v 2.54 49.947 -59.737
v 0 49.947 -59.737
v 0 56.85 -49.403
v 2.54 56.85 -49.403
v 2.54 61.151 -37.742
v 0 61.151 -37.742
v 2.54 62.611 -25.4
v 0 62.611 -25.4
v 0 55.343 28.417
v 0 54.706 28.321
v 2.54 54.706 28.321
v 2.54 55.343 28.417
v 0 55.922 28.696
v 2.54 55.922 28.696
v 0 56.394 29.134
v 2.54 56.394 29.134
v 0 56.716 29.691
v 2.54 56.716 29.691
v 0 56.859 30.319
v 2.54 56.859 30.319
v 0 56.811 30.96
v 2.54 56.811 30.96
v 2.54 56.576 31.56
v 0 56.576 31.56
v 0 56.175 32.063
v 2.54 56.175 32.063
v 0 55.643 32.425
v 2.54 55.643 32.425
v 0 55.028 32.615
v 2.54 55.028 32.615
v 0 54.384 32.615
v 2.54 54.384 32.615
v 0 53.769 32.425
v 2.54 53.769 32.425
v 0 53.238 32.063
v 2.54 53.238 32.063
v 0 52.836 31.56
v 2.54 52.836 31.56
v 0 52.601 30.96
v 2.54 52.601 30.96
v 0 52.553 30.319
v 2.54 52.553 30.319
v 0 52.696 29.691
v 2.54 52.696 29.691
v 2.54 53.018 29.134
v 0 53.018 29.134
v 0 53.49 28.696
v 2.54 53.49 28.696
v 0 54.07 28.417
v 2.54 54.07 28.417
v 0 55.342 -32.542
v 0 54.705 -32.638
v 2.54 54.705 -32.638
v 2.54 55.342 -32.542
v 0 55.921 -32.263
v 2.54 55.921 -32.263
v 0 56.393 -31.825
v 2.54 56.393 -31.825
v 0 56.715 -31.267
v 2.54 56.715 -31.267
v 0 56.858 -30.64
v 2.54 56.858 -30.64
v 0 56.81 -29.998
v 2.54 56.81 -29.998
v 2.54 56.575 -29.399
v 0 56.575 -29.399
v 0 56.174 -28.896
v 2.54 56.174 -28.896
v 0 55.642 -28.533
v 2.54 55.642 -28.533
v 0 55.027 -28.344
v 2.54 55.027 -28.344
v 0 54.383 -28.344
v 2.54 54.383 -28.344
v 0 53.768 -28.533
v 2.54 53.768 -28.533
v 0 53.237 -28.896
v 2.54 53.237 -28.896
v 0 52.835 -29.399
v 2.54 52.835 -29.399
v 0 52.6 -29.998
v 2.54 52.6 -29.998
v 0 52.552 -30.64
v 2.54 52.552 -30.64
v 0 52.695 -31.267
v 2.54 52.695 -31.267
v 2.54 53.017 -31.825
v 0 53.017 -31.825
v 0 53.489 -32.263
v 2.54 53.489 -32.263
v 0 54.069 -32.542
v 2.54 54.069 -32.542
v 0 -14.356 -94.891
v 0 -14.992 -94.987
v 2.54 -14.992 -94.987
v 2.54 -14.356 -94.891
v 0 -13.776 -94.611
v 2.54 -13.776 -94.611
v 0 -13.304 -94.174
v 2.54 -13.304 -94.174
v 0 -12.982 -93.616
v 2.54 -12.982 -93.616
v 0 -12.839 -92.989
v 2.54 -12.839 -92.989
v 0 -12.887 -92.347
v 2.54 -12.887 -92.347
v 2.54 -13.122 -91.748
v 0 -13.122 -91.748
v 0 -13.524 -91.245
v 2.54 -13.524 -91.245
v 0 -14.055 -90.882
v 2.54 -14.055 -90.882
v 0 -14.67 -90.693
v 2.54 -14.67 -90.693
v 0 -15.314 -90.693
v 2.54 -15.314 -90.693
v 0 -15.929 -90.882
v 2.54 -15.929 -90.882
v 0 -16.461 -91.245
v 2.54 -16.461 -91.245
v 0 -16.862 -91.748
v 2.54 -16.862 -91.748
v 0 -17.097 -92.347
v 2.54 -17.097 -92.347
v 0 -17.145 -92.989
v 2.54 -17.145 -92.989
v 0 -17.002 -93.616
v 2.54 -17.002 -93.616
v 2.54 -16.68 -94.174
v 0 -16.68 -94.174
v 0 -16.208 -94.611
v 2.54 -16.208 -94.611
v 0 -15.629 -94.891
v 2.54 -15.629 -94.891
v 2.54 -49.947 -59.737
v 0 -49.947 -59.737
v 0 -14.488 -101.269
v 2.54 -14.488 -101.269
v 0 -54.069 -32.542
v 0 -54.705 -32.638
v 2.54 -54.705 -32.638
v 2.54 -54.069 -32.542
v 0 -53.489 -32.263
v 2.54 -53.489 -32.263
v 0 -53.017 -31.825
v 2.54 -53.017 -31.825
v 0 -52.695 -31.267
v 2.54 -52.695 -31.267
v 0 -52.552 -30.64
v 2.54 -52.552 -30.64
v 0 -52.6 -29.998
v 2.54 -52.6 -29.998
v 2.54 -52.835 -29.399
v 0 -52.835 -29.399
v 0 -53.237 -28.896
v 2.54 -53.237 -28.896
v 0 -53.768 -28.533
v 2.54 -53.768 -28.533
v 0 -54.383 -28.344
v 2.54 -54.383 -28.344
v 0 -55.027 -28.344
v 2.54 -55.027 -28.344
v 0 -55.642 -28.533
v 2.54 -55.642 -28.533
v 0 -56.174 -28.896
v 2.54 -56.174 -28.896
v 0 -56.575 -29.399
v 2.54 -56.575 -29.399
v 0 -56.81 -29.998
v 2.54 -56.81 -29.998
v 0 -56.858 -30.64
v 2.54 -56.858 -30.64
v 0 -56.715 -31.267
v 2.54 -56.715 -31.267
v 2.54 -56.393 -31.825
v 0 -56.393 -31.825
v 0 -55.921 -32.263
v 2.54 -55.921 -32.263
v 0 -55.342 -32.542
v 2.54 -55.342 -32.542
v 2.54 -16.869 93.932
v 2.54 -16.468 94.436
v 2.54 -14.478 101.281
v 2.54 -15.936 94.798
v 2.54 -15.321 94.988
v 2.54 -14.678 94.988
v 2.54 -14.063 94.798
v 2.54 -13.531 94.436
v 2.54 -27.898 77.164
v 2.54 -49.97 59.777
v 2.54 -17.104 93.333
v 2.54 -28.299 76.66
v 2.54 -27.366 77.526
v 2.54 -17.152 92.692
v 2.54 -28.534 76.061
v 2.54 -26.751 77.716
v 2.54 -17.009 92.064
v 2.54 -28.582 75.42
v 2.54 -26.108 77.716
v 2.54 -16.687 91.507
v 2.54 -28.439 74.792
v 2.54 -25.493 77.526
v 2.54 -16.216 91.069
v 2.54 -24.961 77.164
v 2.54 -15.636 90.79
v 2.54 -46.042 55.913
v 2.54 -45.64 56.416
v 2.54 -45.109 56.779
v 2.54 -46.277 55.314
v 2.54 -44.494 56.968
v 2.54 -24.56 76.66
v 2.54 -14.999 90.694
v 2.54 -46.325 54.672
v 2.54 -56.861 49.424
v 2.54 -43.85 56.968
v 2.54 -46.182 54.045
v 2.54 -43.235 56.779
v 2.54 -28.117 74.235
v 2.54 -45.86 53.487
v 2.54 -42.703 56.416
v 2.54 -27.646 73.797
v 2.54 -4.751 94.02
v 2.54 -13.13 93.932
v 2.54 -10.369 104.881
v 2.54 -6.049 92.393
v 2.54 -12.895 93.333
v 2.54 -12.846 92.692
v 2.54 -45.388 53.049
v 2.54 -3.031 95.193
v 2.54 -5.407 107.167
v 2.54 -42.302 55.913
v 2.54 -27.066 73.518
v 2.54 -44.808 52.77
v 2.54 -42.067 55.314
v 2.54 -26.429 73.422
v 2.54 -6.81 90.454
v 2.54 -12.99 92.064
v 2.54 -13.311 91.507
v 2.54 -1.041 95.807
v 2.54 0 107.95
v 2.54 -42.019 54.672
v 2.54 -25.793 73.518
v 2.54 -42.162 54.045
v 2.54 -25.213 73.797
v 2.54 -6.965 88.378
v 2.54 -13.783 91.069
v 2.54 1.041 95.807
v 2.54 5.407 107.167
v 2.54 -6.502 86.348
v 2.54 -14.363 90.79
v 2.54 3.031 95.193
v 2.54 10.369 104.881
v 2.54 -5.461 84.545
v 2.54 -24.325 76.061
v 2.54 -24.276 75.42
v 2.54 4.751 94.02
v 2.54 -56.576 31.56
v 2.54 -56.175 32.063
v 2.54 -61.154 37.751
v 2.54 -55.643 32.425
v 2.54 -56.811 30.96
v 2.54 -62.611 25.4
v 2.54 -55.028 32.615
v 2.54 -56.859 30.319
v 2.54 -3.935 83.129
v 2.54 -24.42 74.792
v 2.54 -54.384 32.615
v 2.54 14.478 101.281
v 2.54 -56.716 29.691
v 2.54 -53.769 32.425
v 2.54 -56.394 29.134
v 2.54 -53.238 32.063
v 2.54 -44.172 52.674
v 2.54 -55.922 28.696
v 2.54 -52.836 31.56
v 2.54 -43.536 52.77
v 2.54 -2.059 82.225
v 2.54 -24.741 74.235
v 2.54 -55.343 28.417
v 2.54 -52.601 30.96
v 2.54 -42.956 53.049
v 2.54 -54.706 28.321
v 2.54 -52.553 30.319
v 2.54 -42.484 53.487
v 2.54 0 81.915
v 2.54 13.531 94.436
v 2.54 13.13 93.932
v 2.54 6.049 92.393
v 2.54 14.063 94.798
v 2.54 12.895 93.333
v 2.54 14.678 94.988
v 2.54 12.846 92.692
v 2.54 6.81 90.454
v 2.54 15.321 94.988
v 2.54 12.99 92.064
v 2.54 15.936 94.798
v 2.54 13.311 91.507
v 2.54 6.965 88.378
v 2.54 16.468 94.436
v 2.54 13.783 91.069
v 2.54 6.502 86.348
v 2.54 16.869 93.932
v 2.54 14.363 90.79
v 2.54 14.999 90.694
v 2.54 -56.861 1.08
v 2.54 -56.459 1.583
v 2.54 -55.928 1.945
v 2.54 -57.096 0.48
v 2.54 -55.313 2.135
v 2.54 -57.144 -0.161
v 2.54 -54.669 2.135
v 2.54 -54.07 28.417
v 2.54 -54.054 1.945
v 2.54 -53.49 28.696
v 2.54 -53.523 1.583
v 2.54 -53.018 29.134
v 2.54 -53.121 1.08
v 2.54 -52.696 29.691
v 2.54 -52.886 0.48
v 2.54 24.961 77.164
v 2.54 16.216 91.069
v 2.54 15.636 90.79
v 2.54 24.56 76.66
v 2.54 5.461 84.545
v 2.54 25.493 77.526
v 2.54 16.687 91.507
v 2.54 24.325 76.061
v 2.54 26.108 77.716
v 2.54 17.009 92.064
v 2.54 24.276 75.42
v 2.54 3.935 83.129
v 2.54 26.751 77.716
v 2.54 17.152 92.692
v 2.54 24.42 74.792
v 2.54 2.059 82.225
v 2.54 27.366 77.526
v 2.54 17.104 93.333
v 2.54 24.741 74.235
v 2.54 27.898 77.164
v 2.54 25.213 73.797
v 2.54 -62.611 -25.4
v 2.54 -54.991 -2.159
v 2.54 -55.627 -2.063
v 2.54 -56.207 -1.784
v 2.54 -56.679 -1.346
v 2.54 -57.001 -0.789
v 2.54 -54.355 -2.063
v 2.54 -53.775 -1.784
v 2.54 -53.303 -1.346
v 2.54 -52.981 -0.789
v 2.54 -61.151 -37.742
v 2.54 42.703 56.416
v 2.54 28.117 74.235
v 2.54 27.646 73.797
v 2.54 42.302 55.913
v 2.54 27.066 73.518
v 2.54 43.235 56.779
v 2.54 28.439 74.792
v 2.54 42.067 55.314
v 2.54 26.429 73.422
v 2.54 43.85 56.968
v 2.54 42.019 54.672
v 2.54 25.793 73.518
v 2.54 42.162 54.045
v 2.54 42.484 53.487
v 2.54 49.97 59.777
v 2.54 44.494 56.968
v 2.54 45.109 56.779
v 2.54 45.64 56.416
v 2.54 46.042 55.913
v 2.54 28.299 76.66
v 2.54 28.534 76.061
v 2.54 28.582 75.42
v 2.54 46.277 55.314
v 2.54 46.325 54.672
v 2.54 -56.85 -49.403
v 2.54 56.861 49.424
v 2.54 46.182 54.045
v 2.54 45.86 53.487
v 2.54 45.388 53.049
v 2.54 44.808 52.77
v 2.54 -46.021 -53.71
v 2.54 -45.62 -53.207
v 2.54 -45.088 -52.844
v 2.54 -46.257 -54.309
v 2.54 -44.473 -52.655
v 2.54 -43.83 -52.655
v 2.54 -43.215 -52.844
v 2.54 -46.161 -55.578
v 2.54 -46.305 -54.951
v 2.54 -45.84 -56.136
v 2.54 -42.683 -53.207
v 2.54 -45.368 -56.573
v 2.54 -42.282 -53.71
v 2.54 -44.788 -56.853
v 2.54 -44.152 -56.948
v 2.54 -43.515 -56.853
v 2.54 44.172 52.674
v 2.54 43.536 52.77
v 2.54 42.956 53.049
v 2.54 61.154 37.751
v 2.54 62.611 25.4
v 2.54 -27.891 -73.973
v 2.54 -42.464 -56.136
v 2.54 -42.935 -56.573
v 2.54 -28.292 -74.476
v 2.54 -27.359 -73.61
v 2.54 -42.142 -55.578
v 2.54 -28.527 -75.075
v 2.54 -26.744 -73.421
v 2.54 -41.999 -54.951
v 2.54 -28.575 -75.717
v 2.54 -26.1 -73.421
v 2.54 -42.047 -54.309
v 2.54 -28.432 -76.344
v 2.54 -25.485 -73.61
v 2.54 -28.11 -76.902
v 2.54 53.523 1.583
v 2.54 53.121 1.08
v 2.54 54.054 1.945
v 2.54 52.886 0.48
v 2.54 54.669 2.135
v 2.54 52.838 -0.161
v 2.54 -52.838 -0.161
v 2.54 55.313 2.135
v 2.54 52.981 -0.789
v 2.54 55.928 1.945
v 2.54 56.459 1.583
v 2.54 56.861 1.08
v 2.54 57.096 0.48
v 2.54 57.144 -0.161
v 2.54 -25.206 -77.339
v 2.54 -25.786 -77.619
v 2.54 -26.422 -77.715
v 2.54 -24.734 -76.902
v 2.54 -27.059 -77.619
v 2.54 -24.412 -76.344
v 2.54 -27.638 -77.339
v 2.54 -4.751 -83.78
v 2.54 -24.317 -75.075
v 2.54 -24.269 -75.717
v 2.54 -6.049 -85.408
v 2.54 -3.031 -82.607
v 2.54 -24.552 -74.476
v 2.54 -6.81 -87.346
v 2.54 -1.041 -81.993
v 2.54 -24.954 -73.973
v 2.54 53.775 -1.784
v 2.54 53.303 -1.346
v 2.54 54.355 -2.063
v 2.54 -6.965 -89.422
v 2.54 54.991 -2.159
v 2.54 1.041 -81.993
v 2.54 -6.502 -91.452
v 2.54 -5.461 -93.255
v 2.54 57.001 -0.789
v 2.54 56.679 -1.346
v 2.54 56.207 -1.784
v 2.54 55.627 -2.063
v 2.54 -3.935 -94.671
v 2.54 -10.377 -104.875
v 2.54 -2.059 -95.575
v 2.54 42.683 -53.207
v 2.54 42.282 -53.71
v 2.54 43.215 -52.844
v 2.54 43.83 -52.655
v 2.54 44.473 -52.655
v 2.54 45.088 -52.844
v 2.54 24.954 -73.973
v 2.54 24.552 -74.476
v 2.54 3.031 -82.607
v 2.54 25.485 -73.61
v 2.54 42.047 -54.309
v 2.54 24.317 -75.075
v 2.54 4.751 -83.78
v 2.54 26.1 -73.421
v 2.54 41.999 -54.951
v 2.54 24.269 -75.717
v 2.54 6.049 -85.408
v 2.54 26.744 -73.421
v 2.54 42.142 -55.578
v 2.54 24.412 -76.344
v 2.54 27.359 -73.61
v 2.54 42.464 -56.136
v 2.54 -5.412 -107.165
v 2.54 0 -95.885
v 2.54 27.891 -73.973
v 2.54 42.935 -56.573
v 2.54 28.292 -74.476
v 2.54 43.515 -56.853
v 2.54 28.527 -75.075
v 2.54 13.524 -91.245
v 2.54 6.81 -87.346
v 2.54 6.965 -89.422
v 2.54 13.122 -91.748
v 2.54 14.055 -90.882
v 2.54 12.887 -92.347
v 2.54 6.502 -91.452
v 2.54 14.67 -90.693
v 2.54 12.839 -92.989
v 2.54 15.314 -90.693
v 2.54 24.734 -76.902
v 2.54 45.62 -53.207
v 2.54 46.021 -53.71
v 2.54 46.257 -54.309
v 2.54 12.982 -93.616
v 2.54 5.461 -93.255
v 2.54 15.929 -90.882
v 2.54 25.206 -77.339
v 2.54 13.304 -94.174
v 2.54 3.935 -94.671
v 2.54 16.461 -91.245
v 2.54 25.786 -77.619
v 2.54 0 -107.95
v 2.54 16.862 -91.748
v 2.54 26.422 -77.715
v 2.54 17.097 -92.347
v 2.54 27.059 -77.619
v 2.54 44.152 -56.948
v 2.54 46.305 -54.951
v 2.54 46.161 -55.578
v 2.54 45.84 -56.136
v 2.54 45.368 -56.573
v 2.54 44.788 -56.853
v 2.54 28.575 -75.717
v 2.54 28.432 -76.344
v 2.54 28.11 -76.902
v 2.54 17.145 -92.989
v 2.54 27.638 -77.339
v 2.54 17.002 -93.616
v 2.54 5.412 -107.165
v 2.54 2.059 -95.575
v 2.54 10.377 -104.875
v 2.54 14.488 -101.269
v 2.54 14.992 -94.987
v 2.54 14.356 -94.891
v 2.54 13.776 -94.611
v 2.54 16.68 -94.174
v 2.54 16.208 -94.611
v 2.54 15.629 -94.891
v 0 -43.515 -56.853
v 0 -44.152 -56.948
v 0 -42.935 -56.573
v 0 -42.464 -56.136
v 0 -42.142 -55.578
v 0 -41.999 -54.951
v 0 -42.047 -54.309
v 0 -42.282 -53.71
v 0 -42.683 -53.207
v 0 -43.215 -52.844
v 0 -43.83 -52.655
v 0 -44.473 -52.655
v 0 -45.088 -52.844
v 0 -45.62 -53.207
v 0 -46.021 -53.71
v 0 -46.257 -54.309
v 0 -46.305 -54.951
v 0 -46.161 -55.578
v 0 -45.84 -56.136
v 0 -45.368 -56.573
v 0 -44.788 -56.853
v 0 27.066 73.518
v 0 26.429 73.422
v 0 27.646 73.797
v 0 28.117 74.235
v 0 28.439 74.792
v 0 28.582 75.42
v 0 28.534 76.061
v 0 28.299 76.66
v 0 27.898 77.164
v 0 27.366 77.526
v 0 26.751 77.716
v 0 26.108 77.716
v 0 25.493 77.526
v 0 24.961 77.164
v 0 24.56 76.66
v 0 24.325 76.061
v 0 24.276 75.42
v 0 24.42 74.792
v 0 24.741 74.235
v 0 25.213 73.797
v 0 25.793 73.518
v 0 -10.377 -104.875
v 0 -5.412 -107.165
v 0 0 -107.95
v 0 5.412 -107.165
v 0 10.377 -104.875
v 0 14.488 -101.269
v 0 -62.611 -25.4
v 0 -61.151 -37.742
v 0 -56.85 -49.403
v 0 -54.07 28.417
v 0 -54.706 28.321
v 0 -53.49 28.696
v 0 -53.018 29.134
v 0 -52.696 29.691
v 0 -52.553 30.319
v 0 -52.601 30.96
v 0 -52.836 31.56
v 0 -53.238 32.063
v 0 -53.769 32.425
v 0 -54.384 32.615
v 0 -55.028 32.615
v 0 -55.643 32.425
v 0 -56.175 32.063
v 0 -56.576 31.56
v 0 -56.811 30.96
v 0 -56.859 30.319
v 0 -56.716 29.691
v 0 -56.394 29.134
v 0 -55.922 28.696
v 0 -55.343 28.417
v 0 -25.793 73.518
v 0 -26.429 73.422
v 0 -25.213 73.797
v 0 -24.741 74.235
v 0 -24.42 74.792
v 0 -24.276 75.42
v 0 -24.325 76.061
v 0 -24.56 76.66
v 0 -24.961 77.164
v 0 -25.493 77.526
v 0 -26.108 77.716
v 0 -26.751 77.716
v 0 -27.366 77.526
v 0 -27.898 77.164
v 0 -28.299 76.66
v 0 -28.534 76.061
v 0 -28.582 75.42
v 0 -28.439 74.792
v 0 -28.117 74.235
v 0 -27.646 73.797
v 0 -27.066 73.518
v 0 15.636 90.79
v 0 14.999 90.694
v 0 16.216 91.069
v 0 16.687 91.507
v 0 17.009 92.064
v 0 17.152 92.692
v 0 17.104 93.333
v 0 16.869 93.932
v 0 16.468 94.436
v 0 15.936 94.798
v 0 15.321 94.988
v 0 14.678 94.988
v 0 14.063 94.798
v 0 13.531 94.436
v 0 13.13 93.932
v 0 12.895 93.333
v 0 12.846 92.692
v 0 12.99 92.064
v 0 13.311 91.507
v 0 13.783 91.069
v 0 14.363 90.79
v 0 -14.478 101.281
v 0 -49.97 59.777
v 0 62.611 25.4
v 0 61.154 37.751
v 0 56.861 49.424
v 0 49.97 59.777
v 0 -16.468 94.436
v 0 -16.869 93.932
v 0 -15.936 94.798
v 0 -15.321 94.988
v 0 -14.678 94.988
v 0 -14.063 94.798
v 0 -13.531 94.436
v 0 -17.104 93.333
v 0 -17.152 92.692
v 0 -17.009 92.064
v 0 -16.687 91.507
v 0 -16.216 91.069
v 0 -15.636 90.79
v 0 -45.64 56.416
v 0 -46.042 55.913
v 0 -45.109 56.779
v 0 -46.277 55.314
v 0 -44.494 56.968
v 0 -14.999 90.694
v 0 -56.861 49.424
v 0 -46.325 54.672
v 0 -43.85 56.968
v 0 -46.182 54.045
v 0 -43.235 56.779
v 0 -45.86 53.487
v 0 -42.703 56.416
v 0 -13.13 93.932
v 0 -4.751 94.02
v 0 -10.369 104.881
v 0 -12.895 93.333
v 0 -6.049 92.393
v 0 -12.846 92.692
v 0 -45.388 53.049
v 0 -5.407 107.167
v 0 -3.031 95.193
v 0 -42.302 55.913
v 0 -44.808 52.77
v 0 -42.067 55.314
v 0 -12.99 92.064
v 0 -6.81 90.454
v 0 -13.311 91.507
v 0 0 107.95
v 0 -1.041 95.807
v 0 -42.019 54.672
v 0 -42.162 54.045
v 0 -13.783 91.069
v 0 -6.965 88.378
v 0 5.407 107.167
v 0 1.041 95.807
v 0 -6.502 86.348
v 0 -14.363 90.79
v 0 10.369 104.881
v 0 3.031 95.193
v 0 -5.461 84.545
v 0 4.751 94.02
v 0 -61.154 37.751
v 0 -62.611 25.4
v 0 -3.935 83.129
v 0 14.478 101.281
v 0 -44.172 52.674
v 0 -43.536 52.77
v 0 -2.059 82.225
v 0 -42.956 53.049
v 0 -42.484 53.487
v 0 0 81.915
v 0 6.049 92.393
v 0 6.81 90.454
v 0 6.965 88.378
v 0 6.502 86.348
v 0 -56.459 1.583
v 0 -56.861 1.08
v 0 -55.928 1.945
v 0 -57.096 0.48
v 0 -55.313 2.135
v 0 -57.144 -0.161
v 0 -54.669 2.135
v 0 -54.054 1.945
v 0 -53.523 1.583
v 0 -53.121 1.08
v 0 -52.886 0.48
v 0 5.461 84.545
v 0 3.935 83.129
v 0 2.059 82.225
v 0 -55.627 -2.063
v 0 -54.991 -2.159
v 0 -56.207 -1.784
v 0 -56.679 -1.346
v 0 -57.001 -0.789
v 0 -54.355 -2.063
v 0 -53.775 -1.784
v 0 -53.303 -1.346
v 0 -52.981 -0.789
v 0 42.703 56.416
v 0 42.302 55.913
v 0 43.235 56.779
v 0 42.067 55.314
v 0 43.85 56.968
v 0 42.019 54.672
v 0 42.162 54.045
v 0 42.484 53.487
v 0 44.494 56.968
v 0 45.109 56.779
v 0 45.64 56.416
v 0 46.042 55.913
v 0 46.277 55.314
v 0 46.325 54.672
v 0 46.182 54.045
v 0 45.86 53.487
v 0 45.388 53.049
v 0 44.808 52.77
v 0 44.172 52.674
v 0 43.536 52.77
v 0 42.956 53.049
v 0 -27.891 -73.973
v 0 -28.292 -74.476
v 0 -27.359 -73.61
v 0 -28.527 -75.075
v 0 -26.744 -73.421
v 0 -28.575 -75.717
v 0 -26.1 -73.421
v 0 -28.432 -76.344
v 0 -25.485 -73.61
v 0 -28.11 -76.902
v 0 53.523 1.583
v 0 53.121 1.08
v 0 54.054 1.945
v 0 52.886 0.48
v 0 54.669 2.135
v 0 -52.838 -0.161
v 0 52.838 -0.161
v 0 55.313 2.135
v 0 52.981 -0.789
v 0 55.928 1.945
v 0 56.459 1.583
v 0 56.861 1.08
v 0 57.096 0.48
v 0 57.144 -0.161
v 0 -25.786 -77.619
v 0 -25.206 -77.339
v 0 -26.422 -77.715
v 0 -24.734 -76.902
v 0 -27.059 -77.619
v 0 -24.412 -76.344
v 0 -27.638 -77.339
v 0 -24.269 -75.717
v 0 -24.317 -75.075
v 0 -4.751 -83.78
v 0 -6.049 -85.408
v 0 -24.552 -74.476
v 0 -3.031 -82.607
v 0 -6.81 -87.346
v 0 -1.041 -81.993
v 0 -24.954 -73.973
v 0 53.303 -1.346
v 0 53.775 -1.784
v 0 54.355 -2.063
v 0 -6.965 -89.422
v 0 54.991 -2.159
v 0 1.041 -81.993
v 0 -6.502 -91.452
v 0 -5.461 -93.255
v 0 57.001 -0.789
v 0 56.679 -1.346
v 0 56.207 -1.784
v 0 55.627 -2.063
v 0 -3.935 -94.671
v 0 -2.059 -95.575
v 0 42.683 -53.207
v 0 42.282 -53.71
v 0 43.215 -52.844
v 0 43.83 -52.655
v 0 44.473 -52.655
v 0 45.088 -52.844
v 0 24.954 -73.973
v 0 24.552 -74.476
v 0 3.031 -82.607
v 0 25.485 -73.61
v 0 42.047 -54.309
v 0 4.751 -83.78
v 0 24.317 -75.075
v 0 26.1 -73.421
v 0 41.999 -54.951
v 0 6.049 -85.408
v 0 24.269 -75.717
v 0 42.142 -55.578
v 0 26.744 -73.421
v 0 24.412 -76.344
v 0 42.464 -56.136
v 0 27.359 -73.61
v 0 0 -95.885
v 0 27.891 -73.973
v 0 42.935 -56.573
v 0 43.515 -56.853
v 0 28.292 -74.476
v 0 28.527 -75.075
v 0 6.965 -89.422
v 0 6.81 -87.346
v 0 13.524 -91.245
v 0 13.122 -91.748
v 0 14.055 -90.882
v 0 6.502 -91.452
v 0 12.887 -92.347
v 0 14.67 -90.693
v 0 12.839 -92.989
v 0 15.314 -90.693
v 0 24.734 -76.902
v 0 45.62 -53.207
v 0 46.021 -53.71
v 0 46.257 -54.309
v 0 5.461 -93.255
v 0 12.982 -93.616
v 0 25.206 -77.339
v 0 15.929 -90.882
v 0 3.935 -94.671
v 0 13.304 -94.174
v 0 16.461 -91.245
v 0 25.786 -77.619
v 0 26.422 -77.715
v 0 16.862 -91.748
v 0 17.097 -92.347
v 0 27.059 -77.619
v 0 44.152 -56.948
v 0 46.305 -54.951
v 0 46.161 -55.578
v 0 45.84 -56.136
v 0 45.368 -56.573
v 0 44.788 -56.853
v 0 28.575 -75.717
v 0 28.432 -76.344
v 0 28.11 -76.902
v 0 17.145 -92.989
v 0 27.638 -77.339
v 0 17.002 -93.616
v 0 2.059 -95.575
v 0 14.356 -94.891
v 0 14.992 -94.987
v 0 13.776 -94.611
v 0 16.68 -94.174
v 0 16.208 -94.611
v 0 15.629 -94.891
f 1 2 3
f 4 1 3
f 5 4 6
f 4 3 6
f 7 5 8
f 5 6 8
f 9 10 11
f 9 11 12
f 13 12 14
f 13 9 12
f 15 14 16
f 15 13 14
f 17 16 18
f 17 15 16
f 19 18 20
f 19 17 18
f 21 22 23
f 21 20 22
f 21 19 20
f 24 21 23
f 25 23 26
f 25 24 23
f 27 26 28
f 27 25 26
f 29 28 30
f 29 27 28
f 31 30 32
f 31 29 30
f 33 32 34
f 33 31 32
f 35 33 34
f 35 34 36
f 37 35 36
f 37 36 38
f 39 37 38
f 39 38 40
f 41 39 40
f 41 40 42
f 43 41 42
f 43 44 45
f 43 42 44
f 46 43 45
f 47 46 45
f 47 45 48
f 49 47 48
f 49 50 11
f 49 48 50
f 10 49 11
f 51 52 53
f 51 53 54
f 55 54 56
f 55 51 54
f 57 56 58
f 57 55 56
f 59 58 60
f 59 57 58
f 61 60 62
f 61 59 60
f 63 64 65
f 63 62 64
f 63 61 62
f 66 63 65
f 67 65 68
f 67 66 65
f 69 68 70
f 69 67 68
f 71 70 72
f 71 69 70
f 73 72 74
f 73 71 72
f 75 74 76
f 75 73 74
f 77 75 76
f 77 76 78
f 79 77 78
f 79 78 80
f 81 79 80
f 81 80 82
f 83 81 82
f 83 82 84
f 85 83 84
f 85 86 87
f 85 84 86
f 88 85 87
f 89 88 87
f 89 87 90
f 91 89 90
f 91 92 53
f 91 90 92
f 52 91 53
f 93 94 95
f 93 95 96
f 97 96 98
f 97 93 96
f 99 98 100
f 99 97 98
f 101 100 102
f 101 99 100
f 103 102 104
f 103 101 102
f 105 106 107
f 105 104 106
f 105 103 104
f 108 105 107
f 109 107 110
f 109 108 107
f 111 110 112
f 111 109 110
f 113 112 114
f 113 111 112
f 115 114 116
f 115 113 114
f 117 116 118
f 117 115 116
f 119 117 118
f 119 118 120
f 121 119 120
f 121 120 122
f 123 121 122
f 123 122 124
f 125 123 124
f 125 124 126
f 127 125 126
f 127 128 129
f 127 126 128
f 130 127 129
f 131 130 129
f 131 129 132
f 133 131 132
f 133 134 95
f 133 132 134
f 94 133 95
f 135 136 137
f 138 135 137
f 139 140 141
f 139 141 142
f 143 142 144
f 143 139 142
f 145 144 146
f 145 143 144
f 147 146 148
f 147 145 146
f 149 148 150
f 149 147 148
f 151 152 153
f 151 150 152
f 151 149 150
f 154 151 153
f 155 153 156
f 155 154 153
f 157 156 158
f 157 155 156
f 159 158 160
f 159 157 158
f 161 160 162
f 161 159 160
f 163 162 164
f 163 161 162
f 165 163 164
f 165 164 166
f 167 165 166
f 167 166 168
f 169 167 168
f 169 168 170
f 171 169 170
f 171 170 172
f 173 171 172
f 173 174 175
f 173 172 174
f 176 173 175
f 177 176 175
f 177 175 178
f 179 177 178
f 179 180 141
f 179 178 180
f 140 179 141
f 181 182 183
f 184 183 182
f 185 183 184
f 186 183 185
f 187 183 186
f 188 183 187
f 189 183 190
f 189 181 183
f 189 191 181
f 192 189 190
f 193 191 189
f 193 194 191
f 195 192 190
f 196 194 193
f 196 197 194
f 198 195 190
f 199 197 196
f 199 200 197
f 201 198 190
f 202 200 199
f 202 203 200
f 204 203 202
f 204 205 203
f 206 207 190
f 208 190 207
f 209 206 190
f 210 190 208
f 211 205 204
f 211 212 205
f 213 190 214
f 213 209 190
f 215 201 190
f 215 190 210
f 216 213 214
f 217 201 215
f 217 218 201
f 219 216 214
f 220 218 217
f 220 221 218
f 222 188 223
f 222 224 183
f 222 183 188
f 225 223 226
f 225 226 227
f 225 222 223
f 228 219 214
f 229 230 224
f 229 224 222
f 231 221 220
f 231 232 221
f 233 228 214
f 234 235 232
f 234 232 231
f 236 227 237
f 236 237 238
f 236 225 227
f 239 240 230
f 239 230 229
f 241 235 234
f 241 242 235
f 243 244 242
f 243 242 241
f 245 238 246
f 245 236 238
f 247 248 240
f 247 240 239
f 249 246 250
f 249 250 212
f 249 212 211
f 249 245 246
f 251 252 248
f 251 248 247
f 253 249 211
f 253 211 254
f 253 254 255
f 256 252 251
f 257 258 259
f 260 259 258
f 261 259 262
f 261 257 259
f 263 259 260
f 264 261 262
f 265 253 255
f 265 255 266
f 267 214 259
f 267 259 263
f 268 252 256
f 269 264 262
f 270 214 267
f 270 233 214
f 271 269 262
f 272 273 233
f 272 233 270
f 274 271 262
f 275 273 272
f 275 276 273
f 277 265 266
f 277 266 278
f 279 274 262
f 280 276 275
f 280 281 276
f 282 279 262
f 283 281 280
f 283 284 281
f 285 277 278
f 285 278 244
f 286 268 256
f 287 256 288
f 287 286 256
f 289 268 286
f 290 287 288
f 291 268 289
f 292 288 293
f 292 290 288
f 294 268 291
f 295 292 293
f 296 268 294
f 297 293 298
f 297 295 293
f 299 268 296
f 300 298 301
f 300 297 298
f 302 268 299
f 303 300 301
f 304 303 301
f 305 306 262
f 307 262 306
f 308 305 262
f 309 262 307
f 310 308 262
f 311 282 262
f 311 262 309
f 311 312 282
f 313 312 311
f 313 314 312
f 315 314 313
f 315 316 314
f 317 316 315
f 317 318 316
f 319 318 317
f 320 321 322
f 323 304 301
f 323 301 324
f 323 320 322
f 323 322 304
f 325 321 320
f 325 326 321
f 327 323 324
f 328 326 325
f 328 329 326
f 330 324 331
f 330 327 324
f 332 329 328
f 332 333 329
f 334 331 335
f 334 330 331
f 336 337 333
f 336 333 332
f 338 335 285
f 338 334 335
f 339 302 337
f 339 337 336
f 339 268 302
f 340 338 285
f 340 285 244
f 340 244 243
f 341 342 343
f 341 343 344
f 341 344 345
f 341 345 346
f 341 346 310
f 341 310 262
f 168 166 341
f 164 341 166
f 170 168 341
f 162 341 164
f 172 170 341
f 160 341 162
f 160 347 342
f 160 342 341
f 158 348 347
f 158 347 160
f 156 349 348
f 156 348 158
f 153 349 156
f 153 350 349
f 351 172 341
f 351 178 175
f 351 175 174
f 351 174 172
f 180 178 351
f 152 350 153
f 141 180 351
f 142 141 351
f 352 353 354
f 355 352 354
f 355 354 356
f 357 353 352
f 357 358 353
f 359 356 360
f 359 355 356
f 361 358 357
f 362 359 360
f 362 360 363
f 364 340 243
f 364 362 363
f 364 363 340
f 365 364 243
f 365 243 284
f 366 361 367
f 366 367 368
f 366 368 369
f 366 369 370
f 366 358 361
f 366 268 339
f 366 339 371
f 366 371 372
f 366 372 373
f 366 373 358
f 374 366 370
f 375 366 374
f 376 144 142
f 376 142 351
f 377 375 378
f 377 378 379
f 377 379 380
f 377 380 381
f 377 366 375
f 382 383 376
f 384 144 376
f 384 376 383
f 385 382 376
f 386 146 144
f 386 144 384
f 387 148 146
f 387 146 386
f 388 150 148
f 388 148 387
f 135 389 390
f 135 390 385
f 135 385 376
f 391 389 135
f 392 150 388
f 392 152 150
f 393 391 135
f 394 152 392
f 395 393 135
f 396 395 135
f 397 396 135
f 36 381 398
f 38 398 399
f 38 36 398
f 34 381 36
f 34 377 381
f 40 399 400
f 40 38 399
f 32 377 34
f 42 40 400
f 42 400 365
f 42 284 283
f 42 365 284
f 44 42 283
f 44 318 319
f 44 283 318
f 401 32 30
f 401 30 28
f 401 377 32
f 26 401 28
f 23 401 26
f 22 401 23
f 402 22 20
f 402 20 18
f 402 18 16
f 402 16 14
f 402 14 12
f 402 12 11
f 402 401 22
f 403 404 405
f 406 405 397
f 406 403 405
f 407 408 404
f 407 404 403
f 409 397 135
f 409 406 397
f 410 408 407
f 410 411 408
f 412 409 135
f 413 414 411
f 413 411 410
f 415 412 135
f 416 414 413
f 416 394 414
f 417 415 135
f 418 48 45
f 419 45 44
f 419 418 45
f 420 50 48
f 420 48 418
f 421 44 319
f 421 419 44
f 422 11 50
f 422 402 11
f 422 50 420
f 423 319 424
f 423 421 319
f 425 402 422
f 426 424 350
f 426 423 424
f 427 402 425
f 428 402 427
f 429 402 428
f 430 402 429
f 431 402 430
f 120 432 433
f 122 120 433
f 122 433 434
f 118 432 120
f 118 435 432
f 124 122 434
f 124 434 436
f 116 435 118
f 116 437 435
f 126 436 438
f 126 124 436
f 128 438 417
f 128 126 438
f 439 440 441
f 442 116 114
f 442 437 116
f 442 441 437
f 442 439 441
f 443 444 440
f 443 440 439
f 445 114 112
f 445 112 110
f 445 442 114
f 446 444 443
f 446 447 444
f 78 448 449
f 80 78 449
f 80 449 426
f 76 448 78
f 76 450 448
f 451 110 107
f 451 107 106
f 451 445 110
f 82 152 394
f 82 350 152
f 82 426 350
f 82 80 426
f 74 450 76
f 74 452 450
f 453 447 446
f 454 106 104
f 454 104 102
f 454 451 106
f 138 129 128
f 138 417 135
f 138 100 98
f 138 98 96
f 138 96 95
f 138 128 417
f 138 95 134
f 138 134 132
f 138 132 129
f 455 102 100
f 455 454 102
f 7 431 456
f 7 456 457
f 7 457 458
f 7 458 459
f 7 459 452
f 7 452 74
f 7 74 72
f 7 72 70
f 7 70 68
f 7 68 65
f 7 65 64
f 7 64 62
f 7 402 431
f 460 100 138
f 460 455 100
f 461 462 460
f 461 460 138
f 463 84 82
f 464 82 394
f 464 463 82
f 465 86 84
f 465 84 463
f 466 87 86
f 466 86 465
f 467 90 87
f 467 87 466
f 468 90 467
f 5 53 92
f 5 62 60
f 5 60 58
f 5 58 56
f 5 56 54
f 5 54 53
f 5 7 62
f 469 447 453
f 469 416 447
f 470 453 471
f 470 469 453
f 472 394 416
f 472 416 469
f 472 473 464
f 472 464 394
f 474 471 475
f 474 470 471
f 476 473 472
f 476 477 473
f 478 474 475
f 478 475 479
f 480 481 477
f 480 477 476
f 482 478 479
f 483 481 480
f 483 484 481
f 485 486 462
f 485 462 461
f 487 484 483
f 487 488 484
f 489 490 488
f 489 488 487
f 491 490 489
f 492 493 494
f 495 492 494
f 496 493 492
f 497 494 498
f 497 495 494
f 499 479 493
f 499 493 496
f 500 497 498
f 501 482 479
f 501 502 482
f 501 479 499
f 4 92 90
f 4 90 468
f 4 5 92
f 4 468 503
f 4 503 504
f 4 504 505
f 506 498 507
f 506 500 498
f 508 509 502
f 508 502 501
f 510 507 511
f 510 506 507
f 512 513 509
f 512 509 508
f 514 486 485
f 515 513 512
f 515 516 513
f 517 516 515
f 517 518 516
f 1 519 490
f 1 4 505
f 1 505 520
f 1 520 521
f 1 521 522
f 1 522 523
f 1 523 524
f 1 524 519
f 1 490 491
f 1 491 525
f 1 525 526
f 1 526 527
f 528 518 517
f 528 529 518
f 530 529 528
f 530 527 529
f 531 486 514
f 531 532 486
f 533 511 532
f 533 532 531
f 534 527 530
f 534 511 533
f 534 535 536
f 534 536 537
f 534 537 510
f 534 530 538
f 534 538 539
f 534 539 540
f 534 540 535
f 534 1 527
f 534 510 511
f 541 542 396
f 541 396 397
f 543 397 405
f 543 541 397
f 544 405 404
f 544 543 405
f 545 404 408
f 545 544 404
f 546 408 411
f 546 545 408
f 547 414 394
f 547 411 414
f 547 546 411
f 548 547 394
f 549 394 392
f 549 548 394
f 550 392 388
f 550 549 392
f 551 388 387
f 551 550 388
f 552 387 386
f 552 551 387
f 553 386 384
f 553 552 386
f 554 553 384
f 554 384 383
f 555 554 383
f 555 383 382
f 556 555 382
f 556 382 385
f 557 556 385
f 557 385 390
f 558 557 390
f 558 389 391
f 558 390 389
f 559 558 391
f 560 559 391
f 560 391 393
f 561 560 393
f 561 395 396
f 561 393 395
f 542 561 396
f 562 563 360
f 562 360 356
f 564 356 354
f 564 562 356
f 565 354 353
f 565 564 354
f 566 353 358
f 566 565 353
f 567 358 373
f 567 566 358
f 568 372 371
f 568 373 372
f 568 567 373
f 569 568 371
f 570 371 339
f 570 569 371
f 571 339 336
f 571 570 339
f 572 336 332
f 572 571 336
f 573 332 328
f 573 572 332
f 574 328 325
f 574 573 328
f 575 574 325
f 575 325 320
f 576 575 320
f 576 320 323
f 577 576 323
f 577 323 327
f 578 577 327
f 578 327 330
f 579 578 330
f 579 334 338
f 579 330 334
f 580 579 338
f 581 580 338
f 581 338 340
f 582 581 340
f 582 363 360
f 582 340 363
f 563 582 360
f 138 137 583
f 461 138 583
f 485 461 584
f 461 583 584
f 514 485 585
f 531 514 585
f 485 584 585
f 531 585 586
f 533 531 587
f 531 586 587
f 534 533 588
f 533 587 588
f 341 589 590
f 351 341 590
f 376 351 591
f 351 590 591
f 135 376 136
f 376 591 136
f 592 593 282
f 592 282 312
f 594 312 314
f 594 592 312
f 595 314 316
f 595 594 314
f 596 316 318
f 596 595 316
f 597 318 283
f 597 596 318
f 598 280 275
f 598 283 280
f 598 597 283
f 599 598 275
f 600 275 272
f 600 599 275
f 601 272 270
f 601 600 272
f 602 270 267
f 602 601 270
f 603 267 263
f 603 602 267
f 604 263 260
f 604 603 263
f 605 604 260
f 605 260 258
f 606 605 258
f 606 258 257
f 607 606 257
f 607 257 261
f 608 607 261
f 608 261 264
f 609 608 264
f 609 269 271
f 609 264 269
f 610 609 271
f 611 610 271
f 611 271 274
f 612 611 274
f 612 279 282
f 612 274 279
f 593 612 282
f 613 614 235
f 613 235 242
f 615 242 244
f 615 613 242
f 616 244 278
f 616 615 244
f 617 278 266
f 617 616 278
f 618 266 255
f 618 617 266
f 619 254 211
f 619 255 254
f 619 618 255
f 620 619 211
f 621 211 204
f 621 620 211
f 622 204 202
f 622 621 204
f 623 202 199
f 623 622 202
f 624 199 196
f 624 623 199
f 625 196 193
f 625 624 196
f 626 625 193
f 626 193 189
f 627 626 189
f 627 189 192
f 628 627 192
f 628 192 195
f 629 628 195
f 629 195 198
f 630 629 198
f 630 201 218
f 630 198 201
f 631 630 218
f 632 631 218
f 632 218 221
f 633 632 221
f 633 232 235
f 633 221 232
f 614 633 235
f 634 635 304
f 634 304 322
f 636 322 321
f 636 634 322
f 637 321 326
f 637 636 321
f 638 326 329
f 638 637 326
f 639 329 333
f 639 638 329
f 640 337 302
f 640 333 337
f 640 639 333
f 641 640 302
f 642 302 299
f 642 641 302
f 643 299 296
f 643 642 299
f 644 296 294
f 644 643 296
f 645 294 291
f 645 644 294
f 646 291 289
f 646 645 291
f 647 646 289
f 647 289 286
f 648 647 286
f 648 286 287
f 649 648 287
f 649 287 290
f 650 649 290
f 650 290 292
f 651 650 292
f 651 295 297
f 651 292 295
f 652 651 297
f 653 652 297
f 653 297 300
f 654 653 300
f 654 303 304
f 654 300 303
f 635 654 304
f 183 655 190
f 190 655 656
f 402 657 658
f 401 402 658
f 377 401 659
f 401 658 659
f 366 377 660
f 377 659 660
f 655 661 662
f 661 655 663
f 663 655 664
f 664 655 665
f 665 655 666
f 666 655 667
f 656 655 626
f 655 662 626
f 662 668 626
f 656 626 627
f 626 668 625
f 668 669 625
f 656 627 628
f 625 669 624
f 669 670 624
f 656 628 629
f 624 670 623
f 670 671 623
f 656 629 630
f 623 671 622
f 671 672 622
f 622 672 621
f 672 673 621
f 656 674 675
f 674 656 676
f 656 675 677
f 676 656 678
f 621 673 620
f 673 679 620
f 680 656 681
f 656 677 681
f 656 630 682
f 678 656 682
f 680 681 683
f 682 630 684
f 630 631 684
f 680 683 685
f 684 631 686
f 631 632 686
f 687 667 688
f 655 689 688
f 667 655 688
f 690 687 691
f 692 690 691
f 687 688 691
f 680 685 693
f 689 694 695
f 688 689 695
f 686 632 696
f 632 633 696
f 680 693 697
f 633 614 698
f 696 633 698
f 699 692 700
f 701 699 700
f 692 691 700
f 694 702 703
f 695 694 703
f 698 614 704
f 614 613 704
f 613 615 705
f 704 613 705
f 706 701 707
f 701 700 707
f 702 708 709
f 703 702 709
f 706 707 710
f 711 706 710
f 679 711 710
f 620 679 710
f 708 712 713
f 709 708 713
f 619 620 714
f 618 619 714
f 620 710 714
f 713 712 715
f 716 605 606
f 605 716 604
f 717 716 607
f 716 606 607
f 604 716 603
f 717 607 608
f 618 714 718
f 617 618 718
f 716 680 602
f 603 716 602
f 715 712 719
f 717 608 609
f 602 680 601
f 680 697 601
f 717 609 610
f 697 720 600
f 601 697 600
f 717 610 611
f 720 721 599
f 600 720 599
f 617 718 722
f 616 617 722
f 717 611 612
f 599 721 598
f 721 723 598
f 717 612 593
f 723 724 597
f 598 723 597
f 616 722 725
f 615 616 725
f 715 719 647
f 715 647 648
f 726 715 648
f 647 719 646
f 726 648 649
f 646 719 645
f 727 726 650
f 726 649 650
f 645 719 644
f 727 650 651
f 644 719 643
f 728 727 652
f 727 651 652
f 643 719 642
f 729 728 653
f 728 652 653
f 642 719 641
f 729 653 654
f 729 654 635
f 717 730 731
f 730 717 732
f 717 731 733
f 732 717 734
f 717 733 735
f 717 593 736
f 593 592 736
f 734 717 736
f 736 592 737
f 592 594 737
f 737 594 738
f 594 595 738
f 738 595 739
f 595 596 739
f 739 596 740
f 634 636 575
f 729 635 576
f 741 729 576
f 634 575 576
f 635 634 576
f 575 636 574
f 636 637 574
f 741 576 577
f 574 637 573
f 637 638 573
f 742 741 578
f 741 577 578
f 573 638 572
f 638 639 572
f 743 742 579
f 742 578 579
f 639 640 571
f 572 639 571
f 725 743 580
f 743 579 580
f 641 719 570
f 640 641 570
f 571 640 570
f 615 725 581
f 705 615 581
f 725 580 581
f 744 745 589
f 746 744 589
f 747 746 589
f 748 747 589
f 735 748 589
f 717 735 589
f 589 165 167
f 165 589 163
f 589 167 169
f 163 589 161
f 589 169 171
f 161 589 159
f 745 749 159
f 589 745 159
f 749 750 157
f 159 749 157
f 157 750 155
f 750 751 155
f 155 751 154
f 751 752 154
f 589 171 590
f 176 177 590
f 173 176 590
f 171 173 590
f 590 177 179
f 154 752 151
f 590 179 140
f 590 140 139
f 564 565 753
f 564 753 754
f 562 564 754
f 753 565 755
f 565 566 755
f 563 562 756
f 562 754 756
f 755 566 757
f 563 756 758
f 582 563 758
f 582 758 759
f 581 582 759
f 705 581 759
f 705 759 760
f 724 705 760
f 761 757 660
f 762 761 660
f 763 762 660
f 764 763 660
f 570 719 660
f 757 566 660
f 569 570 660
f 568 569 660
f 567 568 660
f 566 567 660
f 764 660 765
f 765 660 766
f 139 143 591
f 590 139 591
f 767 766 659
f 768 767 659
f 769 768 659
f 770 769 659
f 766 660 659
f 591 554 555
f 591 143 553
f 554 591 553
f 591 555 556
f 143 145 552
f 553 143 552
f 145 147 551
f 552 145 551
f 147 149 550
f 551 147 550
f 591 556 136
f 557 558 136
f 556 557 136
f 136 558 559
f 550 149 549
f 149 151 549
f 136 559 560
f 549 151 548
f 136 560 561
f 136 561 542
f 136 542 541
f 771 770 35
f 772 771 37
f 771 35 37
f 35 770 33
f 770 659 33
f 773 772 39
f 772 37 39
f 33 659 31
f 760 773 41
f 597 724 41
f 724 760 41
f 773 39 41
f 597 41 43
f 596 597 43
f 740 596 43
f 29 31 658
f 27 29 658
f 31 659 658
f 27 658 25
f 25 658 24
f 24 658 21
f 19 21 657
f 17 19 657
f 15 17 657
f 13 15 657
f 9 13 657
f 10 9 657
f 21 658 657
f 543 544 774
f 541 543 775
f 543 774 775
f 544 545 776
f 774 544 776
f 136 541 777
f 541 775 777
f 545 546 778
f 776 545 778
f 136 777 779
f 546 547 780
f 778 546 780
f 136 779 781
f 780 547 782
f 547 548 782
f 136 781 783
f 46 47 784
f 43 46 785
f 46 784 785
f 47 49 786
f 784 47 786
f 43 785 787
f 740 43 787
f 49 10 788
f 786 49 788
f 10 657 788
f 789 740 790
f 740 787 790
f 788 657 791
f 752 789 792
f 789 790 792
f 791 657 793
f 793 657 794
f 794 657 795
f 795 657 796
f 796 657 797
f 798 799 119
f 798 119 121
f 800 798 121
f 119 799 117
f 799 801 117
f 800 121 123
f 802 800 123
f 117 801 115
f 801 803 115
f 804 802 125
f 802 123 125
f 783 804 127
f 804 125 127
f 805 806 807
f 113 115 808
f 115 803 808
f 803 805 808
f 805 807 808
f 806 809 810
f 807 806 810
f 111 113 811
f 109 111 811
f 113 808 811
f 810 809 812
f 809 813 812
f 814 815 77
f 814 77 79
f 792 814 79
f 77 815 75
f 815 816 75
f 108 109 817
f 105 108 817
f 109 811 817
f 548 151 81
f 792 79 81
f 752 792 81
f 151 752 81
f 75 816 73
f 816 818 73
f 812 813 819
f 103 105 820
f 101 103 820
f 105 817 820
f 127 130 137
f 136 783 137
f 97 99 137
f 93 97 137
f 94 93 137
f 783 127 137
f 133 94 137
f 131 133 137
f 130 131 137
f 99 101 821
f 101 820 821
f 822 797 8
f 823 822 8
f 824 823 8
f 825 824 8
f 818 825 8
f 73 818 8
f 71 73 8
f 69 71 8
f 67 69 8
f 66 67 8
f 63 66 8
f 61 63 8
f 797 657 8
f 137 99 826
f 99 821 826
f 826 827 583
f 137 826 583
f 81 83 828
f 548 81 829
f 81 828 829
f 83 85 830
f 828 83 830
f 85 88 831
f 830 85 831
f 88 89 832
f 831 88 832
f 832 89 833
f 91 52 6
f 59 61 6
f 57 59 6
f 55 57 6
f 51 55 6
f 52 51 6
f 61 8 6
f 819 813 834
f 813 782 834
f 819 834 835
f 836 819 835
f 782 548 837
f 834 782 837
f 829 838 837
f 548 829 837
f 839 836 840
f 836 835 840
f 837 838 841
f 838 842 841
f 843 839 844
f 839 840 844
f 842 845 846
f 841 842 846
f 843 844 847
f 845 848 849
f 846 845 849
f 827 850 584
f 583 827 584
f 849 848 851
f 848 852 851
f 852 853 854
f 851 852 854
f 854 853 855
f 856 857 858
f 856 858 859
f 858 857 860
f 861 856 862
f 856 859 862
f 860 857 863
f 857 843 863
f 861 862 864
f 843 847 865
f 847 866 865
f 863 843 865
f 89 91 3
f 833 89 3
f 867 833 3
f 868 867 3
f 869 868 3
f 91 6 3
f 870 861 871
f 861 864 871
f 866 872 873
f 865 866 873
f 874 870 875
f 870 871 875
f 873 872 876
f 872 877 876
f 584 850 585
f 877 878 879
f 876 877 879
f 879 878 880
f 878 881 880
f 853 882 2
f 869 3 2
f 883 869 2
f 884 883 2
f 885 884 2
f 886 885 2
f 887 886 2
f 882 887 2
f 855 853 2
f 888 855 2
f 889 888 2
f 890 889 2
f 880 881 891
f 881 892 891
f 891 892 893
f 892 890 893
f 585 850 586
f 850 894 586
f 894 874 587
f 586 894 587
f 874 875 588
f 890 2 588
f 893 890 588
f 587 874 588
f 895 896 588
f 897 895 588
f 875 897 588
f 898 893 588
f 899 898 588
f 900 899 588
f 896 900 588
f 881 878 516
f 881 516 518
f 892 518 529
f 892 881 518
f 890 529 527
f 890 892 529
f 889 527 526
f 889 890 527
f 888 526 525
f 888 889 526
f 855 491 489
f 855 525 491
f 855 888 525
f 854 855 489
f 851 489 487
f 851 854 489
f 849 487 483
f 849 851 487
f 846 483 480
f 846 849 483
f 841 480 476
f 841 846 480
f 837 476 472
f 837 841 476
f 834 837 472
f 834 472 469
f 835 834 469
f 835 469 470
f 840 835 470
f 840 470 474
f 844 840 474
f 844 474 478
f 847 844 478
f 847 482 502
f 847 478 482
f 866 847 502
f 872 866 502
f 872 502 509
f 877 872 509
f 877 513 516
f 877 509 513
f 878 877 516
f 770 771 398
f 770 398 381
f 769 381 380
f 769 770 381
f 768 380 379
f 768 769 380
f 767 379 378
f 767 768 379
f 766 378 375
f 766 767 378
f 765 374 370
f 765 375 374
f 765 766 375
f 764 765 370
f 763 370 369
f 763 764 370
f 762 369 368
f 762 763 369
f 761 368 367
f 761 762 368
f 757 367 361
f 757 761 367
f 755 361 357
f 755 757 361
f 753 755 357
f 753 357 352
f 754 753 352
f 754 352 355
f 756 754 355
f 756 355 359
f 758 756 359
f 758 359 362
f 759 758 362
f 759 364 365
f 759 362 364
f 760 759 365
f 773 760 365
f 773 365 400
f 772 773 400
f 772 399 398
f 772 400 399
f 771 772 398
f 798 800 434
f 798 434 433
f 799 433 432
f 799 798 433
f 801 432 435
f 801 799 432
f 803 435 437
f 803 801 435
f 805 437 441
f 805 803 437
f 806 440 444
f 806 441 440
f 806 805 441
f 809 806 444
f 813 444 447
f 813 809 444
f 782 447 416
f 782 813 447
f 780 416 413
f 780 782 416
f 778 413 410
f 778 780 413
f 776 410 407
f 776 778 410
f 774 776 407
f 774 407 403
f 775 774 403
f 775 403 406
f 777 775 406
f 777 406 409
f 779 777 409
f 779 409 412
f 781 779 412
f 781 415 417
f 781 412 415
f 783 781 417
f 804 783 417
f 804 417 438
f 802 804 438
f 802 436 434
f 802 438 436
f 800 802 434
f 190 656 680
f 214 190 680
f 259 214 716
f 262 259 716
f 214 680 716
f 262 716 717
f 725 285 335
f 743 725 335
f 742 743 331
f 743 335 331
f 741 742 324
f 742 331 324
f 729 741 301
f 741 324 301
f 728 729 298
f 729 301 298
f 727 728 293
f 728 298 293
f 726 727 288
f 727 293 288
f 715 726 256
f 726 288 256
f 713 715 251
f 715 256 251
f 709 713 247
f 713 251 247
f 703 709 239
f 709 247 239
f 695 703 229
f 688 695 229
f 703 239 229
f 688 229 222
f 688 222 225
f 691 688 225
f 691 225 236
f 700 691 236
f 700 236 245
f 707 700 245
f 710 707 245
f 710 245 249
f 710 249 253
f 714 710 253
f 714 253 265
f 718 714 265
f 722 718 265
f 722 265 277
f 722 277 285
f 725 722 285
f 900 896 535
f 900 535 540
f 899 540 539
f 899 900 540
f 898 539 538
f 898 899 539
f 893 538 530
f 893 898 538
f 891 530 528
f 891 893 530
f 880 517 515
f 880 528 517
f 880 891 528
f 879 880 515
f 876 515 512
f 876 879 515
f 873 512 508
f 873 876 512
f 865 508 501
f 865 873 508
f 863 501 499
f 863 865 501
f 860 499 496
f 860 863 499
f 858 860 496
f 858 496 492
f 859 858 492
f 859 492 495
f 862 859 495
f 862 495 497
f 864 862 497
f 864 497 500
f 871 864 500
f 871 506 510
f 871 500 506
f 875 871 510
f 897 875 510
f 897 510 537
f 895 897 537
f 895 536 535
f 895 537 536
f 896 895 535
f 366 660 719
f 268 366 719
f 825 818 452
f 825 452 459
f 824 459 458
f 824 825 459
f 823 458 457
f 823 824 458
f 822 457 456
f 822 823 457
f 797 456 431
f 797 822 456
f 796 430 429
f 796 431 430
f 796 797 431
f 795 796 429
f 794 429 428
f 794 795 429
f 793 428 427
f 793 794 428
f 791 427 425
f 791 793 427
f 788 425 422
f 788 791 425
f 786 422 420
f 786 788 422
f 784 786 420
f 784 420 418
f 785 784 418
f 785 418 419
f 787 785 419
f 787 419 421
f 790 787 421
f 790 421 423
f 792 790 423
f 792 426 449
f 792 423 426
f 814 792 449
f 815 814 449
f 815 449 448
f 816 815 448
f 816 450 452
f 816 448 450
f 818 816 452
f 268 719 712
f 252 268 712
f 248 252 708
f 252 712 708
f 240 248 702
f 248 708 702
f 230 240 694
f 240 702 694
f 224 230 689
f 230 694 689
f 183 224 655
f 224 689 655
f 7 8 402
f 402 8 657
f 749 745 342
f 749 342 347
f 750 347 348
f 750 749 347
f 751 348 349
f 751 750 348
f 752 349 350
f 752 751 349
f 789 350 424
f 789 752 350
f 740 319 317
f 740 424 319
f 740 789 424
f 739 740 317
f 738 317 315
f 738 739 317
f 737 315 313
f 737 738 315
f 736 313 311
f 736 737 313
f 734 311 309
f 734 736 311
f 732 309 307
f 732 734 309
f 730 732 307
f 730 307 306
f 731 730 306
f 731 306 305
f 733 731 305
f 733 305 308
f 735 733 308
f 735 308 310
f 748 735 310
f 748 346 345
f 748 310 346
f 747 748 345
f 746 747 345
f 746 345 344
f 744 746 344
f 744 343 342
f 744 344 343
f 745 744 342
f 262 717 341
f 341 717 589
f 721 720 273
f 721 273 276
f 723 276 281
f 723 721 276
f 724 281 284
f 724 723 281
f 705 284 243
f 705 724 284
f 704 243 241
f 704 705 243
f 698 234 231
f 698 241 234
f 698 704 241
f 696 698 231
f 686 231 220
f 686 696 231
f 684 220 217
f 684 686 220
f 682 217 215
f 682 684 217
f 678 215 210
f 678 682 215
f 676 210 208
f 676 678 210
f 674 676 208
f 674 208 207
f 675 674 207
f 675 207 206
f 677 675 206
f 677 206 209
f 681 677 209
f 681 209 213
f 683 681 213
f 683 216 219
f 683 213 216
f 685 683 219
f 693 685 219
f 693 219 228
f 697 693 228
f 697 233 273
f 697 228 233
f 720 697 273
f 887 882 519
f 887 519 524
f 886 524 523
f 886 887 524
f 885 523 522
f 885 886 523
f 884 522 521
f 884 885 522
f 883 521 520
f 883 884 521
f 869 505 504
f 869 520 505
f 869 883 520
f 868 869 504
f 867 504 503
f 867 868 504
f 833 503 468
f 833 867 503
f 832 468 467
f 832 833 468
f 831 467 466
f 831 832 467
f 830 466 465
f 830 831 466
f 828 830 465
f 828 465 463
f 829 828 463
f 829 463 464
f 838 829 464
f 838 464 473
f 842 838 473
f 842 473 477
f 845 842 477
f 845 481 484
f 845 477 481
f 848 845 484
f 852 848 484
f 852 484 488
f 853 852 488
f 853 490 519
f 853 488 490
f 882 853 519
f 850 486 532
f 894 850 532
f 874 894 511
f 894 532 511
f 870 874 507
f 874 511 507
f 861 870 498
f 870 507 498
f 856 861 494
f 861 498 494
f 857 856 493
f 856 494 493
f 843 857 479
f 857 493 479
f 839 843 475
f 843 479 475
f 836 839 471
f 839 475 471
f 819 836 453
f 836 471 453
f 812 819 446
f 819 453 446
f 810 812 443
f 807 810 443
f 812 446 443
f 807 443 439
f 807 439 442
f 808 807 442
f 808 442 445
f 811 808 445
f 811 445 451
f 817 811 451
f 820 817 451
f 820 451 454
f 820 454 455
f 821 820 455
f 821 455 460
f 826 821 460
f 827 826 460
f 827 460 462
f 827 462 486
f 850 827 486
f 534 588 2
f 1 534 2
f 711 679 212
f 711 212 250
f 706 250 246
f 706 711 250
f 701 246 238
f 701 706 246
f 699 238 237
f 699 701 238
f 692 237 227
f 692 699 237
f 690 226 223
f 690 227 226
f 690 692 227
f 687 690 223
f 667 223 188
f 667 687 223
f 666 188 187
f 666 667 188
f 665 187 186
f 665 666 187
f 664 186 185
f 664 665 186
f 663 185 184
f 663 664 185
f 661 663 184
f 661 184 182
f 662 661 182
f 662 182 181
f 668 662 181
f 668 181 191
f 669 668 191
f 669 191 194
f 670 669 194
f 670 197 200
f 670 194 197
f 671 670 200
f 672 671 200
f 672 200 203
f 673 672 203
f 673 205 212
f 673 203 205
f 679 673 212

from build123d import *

# Parameters (mm, degrees)
SKETCH1_R               = 19.05
BOSS_EXTRUDE1_DEPTH     = 2.54
CUT_EXTRUDE3_DEPTH      = 125.81903469
CUT_EXTRUDE3_DEPTH_BACK = 125.81903469
SKETCH4_R               = 2.159
SKETCH5_R               = 6.985
CUT_EXTRUDE4_DEPTH      = 6.35


with BuildPart() as part:
    # Sketch1 → Boss-Extrude1 (new body)
    with BuildSketch(Plane(origin=(0, 0, 0), x_dir=(0, 0, -1), z_dir=(1, 0, 0))):
        with BuildLine():
            Line((25.4, 62.611), (-25.4, 62.611))
            ThreePointArc((-25.4, 62.611), (-43.71389723, 59.350669702), (-59.777434529, 49.970298982))
            Line((-59.777434529, 49.970298982), (-101.281034529, 14.478))
            ThreePointArc((-101.281034529, 14.478), (-80.929937509, 17.302618411), (-69.85, 0))
            ThreePointArc((-69.85, 0), (-80.929937509, -17.302618411), (-101.281034529, -14.478))
            Line((-101.281034529, -14.478), (-59.777434529, -49.970298982))
            ThreePointArc((-59.777434529, -49.970298982), (-43.71389723, -59.350669702), (-25.4, -62.611))
            Line((-25.4, -62.611), (25.4, -62.611))
            ThreePointArc((25.4, -62.611), (43.699078076, -59.34404997), (59.737214243, -49.946847768))
            Line((59.737214243, -49.946847768), (101.269374674, -14.487973703))
            ThreePointArc((101.269374674, -14.487973703), (69.85, -7.706e-06), (101.269379322, 14.48794821))
            Line((101.269379322, 14.48794821), (59.737230268, 49.9468356))
            ThreePointArc((59.737230268, 49.9468356), (43.699087699, 59.344046737), (25.4, 62.611))
        make_face()
        with Locations((88.9, -1.0762e-05)):
            Circle(SKETCH1_R)
        with Locations((-88.9, 0)):
            Circle(SKETCH1_R)
    extrude(amount=BOSS_EXTRUDE1_DEPTH)

    # Sketch4 → Cut-Extrude3 (cut, two sides: drawn at the far end of the back side and taken through both)
    with BuildSketch(Plane(origin=(2.54, 0, 0), x_dir=(0, 0, -1), z_dir=(1, 0, 0)).offset(-CUT_EXTRUDE3_DEPTH_BACK)):
        with Locations((-30.48, 54.706186836)):
            Circle(SKETCH4_R)
        with Locations((-54.833341451, 44.171983407)):
            Circle(SKETCH4_R)
        with Locations((54.789478539, 44.151652011)):
            Circle(SKETCH4_R)
        with Locations((30.478659799, 54.70517335)):
            Circle(SKETCH4_R)
        with Locations((-75.580981084, 26.429391704)):
            Circle(SKETCH4_R)
        with Locations((75.555553066, 26.422208316)):
            Circle(SKETCH4_R)
        with Locations((0, 54.991)):
            Circle(SKETCH4_R)
        with Locations((-92.852981084, 14.999391704)):
            Circle(SKETCH4_R)
        with Locations((92.827553066, 14.992208316)):
            Circle(SKETCH4_R)
        with Locations((92.827553066, -14.992208316)):
            Circle(SKETCH4_R)
        with Locations((75.555553066, -26.422208316)):
            Circle(SKETCH4_R)
        with Locations((54.789478539, -44.151652011)):
            Circle(SKETCH4_R)
        with Locations((30.478659799, -54.70517335)):
            Circle(SKETCH4_R)
        with Locations((0, -54.991)):
            Circle(SKETCH4_R)
        with Locations((-30.48, -54.706186836)):
            Circle(SKETCH4_R)
        with Locations((-54.833341451, -44.171983407)):
            Circle(SKETCH4_R)
        with Locations((-75.580981084, -26.429391704)):
            Circle(SKETCH4_R)
        with Locations((-92.852981084, -14.999391704)):
            Circle(SKETCH4_R)
    extrude(amount=CUT_EXTRUDE3_DEPTH + CUT_EXTRUDE3_DEPTH_BACK, mode=Mode.SUBTRACT)

    # Sketch5 → Cut-Extrude4 (cut)
    with BuildSketch(Plane(origin=(2.54, 0, 0), x_dir=(0, 0, -1), z_dir=(1, 0, 0))):
        with Locations((-88.9, 0)):
            Circle(SKETCH5_R)
        with Locations((88.9, -1.0762e-05)):
            Circle(SKETCH5_R)
    extrude(amount=-CUT_EXTRUDE4_DEPTH, mode=Mode.SUBTRACT)


solid = part.part
